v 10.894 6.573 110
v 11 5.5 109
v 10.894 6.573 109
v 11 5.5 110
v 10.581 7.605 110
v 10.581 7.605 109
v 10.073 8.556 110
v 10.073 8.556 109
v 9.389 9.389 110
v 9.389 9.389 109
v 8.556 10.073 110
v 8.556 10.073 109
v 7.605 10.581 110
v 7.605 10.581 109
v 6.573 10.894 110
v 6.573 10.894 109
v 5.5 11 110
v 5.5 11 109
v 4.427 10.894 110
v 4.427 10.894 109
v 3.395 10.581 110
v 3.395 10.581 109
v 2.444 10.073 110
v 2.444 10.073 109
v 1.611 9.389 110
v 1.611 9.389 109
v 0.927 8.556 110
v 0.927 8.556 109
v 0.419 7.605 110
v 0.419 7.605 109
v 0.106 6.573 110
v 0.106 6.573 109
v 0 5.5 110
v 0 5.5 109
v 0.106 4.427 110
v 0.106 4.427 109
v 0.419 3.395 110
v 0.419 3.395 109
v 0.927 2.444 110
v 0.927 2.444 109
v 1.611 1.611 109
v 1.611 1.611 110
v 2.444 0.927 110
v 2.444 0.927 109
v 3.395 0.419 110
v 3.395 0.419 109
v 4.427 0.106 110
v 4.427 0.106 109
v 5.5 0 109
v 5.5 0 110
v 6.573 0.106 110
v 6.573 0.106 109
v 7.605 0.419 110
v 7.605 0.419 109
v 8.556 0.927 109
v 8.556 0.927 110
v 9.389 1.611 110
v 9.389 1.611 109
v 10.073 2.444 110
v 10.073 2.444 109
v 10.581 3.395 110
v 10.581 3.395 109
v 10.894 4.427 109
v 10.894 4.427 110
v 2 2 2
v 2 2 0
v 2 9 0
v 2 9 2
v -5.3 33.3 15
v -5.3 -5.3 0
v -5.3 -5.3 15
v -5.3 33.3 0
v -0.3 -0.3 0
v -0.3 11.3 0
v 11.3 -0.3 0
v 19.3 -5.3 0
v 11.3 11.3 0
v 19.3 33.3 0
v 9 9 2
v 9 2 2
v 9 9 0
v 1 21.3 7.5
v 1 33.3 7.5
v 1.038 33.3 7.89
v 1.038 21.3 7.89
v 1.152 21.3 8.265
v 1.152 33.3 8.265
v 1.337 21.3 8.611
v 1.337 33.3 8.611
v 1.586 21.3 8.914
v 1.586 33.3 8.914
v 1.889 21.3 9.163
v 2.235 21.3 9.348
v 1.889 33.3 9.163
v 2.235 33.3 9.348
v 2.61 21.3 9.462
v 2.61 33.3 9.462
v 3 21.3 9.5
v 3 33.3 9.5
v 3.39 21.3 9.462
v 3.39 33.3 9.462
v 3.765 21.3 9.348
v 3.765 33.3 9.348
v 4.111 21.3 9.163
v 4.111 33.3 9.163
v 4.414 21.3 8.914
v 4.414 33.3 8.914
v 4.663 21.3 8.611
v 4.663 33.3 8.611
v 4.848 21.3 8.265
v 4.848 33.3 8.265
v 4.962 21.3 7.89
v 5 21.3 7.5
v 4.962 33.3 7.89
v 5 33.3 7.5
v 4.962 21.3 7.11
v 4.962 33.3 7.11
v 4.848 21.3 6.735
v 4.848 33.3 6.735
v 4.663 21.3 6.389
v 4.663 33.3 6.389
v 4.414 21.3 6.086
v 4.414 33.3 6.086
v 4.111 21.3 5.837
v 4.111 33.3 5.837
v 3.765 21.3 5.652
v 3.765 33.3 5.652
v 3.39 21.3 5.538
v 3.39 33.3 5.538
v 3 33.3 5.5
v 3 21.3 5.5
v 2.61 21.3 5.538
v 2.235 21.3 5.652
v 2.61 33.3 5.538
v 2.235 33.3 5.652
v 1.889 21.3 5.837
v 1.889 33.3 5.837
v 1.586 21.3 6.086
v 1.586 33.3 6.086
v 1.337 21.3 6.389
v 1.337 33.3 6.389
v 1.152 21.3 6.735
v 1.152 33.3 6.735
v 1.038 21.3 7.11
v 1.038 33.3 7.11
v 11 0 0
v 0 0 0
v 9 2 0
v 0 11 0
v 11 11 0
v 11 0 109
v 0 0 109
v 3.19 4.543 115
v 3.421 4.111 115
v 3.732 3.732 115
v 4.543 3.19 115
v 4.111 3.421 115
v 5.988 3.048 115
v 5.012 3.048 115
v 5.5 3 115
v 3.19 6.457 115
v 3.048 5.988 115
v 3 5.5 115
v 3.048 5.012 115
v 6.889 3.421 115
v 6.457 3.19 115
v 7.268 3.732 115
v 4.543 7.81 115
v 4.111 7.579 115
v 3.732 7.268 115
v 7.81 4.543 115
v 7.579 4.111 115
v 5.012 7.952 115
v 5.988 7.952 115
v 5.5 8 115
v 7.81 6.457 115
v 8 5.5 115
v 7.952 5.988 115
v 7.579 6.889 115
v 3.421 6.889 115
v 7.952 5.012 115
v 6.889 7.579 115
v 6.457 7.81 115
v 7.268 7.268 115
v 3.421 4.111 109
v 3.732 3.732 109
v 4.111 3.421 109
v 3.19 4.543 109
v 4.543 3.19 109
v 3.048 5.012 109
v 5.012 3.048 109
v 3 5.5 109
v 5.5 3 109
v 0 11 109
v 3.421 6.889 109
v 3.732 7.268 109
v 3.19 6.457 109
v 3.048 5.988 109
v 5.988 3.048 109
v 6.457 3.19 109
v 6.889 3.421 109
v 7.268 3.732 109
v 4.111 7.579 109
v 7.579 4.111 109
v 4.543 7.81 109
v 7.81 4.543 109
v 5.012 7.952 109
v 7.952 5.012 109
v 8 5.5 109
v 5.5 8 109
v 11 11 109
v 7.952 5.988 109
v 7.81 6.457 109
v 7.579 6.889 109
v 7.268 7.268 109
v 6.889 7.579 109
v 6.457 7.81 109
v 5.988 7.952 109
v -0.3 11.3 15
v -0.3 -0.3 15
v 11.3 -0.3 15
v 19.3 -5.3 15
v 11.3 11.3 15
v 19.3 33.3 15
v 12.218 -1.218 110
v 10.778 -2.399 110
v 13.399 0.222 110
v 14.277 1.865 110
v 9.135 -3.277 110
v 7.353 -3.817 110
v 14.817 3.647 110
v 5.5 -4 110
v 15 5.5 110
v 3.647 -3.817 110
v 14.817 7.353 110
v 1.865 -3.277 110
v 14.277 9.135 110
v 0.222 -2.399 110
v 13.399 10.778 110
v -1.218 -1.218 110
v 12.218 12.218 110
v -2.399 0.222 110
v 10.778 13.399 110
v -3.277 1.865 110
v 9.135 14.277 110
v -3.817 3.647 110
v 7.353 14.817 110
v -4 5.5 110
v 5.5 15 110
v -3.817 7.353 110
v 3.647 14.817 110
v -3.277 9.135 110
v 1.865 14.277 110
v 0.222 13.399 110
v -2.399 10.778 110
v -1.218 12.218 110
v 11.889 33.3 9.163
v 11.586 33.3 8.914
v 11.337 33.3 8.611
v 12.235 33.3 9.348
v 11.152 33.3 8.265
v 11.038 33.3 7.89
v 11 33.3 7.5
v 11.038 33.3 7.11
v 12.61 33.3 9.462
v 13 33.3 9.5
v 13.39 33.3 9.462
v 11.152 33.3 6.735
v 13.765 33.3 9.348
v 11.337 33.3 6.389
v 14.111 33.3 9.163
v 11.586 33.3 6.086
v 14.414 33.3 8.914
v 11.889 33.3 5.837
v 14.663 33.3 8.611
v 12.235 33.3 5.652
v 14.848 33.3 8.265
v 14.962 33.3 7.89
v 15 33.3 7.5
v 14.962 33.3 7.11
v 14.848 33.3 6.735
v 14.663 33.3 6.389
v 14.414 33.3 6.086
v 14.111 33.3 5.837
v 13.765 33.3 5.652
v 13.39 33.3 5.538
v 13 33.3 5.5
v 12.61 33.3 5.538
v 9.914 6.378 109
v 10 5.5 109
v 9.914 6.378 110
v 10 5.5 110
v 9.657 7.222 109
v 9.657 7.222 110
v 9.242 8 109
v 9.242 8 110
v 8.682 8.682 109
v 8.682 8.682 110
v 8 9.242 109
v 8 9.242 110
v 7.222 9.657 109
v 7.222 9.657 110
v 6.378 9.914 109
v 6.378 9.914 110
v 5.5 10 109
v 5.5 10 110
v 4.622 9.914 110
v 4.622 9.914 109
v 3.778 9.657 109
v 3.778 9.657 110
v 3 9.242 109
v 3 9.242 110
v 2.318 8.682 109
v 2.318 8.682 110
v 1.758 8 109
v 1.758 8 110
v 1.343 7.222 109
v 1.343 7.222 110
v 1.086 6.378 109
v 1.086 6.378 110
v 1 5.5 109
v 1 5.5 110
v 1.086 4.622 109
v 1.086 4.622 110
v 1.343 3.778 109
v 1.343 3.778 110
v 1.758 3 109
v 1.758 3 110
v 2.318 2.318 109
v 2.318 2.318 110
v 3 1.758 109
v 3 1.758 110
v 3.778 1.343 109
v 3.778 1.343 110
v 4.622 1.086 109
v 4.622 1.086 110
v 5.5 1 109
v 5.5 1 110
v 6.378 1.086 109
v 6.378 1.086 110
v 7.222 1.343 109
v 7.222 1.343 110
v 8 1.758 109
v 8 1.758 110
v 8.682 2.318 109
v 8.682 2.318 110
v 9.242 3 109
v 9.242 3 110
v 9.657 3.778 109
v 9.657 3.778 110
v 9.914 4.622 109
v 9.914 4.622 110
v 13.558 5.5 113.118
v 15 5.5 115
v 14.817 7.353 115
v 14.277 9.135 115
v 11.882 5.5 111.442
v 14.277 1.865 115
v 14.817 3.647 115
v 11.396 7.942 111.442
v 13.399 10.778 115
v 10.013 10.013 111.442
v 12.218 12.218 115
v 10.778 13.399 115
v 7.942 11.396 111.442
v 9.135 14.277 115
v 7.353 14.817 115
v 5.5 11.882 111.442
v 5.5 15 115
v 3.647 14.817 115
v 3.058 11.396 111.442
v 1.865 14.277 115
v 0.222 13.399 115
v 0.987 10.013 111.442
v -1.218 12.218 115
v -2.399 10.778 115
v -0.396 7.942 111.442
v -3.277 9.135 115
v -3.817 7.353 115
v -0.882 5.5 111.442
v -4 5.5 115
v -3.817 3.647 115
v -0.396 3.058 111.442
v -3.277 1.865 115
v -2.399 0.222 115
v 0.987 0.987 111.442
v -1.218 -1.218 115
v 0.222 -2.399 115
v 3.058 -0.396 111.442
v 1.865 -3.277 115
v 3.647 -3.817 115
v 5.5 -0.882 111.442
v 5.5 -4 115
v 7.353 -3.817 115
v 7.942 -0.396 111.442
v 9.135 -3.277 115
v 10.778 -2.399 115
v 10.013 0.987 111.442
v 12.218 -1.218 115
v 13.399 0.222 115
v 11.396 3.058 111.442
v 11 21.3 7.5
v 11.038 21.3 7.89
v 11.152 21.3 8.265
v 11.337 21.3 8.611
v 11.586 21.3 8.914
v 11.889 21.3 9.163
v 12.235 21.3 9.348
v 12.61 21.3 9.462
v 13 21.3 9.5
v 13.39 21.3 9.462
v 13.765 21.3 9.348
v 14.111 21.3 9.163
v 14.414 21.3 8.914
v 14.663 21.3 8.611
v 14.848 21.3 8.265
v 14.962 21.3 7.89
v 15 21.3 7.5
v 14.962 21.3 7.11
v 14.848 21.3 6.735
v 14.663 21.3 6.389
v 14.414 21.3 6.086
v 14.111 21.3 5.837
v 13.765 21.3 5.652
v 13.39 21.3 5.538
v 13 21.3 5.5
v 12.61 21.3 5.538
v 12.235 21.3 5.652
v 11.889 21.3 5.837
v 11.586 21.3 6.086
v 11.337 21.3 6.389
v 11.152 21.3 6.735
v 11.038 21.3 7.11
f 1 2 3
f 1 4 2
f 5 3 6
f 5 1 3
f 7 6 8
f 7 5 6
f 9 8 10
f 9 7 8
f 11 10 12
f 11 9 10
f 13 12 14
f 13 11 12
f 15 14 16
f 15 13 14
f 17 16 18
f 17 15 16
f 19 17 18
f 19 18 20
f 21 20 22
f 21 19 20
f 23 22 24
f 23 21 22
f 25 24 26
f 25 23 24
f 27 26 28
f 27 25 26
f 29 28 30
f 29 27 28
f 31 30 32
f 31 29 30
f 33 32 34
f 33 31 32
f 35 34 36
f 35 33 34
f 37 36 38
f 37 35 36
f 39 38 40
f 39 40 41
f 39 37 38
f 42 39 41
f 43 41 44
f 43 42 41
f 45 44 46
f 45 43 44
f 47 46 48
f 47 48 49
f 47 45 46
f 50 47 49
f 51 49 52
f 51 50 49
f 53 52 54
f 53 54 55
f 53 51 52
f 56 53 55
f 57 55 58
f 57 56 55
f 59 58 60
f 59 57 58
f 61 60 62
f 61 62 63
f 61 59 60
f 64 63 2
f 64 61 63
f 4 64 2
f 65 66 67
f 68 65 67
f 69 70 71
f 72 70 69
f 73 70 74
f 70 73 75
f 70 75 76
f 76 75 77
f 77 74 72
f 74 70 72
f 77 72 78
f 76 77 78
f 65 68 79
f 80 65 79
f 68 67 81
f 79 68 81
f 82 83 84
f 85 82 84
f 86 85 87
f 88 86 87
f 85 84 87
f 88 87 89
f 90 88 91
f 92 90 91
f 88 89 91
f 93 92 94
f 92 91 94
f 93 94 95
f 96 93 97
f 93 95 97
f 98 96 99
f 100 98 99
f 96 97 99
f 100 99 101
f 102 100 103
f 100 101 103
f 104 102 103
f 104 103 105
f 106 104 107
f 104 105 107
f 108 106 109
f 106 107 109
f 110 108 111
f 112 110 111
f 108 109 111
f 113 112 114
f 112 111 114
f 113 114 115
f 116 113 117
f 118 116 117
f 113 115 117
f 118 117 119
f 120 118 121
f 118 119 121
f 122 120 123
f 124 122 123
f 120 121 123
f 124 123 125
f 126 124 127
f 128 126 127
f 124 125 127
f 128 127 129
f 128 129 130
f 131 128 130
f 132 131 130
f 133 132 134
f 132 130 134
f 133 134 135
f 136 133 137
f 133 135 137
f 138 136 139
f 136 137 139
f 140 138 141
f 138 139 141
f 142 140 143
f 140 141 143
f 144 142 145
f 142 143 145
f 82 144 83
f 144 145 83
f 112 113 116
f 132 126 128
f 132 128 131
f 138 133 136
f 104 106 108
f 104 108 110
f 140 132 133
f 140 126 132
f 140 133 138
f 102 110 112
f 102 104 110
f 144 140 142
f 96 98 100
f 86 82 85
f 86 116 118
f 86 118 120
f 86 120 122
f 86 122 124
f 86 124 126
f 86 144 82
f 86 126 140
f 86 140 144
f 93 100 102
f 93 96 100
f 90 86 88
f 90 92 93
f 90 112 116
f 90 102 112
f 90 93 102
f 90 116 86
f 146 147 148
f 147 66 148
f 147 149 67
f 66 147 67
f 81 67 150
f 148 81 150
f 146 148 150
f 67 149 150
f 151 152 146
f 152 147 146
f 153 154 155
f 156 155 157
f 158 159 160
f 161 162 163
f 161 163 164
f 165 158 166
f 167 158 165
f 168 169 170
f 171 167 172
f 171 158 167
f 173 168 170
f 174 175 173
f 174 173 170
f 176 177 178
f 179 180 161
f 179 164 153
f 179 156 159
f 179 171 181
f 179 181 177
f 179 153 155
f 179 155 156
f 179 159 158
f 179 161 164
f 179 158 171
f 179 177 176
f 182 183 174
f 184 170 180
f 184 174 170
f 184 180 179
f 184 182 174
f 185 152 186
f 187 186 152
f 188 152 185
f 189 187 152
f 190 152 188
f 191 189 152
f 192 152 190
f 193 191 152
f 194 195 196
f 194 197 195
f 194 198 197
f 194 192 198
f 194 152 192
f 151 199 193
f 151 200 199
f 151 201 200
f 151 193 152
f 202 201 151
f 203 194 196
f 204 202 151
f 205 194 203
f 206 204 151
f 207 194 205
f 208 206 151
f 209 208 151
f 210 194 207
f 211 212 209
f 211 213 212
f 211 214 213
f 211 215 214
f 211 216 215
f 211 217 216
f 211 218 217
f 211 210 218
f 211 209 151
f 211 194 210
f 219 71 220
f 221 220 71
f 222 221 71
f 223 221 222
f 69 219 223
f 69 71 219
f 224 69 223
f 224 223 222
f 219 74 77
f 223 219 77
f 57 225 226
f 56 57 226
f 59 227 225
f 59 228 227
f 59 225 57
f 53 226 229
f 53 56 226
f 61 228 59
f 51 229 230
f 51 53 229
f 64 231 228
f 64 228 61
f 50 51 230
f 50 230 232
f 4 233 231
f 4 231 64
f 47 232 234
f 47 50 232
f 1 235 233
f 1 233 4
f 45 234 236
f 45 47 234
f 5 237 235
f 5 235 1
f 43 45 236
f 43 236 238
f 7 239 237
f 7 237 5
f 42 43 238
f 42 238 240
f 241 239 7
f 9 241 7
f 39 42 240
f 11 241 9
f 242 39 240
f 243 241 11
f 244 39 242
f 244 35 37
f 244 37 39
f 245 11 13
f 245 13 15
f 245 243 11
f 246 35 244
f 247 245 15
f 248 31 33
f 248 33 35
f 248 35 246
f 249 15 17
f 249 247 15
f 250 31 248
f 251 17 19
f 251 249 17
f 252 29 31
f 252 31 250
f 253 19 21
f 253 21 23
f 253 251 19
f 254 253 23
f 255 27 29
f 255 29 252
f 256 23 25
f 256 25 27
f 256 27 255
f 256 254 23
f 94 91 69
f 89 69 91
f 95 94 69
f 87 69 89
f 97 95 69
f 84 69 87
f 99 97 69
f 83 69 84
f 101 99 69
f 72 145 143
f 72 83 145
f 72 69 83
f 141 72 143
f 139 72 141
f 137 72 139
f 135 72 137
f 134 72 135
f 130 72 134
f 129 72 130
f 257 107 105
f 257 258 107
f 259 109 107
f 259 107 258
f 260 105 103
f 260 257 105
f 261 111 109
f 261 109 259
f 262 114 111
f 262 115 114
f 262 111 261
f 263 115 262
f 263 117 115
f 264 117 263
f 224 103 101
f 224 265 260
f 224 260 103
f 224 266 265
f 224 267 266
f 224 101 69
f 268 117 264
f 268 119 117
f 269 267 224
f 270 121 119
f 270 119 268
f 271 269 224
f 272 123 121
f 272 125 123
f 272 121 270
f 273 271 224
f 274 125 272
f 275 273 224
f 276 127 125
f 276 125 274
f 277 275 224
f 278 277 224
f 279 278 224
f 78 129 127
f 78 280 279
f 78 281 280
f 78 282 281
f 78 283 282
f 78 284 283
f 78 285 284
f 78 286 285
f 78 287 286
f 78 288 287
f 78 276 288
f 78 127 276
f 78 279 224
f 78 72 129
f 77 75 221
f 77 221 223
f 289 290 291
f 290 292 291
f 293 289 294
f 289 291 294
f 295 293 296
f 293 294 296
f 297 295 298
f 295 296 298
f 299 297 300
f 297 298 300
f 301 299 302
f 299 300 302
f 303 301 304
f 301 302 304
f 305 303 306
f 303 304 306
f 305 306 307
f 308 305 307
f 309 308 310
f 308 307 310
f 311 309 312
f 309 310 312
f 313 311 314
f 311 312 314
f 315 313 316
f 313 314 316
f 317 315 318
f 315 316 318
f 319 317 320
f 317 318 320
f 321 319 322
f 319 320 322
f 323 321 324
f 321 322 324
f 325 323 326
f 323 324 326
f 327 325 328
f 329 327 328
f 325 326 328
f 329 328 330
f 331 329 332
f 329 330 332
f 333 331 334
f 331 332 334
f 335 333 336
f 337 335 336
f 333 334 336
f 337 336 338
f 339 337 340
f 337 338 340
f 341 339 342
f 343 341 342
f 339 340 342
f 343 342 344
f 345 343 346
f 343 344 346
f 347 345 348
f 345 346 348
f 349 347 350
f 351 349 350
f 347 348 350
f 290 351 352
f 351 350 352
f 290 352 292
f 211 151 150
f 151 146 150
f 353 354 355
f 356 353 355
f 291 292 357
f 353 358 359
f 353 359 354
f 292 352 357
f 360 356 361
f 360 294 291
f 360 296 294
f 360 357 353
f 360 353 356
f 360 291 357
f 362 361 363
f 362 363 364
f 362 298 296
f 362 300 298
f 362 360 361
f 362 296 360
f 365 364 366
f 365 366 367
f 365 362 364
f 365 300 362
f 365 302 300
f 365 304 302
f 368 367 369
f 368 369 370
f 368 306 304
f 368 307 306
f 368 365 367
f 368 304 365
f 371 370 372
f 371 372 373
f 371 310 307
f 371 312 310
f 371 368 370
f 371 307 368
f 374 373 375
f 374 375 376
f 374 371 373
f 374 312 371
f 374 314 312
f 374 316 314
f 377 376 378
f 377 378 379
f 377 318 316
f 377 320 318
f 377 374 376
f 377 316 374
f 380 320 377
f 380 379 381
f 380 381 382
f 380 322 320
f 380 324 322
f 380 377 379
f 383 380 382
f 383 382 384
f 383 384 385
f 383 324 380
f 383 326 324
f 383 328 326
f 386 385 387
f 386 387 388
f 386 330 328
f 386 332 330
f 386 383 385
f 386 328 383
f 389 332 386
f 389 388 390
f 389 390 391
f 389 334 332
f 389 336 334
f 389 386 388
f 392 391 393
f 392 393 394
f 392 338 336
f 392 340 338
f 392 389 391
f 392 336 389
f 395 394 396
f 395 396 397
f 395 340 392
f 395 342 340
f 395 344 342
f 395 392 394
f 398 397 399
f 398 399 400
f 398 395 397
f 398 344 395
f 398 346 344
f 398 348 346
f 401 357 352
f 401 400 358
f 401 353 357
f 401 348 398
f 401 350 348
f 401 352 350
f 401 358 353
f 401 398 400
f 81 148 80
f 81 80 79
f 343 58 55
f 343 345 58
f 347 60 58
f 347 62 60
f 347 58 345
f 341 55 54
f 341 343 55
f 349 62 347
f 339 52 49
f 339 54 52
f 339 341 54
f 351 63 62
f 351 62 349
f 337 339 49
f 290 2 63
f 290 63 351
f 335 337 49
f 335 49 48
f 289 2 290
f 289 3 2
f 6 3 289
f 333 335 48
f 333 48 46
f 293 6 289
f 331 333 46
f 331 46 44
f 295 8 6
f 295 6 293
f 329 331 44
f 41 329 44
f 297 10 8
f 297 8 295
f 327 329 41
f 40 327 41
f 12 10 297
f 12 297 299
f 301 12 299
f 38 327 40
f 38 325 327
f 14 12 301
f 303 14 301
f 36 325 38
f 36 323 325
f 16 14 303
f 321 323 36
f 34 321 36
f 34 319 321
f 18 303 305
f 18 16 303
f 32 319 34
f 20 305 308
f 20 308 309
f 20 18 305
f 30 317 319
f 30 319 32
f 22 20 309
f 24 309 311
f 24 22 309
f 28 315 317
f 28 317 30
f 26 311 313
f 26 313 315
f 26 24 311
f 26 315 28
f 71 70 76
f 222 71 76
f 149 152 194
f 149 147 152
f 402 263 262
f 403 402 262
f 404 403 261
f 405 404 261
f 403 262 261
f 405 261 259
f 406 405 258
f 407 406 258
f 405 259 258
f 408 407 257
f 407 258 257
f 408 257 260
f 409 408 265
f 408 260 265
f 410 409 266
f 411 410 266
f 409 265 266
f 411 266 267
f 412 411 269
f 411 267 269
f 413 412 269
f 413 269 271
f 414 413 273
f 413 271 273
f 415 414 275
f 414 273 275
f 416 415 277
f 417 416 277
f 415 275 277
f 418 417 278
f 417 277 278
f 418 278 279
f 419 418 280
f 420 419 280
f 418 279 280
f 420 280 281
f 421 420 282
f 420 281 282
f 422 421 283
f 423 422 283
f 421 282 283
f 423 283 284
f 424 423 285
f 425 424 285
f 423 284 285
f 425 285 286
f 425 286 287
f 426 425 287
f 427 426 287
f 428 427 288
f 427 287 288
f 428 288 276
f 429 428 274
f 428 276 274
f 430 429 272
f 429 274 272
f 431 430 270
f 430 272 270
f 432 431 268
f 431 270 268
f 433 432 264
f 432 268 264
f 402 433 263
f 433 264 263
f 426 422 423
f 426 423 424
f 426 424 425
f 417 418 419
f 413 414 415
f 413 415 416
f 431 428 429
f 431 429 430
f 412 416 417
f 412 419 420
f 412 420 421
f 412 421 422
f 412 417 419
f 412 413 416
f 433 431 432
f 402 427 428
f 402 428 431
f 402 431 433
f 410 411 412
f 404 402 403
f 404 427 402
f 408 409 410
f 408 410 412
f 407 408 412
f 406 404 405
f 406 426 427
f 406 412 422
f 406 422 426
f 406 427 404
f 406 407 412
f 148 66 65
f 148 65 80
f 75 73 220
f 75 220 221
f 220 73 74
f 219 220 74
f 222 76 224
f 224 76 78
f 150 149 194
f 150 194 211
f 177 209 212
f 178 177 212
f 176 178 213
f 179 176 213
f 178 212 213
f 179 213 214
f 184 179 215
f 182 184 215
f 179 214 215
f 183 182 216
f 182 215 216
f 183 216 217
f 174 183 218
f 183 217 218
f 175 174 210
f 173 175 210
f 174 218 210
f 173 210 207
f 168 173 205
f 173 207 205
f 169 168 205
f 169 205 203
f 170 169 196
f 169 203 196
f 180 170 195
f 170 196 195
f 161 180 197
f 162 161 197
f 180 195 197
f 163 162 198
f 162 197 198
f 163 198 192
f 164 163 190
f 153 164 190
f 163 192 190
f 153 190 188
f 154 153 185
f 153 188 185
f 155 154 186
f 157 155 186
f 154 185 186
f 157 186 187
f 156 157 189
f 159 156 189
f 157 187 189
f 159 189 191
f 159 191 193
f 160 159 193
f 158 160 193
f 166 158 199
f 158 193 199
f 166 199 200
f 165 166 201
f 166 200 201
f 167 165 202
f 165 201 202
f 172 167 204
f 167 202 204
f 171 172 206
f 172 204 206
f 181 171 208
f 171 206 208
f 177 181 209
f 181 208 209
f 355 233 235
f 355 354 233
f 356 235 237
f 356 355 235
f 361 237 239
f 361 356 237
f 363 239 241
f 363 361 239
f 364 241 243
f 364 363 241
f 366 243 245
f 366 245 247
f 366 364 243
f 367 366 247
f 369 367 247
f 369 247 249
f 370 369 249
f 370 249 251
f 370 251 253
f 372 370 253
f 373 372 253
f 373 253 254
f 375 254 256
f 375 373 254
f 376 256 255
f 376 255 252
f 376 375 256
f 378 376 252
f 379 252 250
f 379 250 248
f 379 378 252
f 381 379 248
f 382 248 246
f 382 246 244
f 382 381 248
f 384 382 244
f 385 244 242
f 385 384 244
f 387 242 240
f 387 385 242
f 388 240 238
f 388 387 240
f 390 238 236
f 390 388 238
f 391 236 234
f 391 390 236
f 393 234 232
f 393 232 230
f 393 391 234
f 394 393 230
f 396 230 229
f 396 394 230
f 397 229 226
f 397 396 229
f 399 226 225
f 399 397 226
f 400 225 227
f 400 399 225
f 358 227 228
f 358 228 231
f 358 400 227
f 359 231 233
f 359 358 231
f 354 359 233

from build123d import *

# Parameters (mm, degrees)
F0_W      = 11
F0_H      = 11
F0_W_2    = 7
F0_H_2    = 7
F1_DEPTH  = 2
F2_W      = 11
F2_H      = 11
F3_DEPTH  = 107
F4_R      = 2.5
F5_DEPTH  = 6
F9_W      = 1
F9_H      = 1
F11_W     = 24.6
F11_H     = 38.6
F11_W_2   = 11.6
F11_H_2   = 11.6
F12_DEPTH = 15
F13_R     = 2
F14_DEPTH = 12


with BuildPart() as f1:
    # F0 (on Top) → F1 (new body)
    with BuildSketch(Plane.XY):
        with Locations((5.5, 5.5)):
            Rectangle(F0_W, F0_H)
        with Locations((5.5, 5.5)):
            Rectangle(F0_W_2, F0_H_2, mode=Mode.SUBTRACT)
    extrude(amount=F1_DEPTH)

    # F2 (on face) → F3 (join)
    with BuildSketch(Plane.XY.offset(2)):
        with Locations((5.5, 5.5)):
            Rectangle(F2_W, F2_H)
    extrude(amount=F3_DEPTH)

    # F4 (on face) → F5 (join)
    with BuildSketch(Plane.XY.offset(109)):
        with Locations((5.5, 5.5)):
            Circle(F4_R)
    extrude(amount=F5_DEPTH)


with BuildPart() as f10:
    # F9 (on mid) → F10 (revolve)
    with BuildSketch(Plane.XZ.offset(-5.5)):
        with BuildLine():
            Line((11, 110), (15, 110))
            Line((15, 110), (15, 115))
            ThreePointArc((15, 115), (12.747548784, 112.252451216), (10, 110))
            Line((10, 110), (11, 110))
        make_face()
        with Locations((10.5, 109.5)):
            Rectangle(F9_W, F9_H)
    revolve(axis=Axis((5.5, 5.5, 115), (0, 0, 1)))


with BuildPart() as f12:
    # F11 (on Top) → F12 (new body)
    with BuildSketch(Plane.XY):
        with Locations((7, 14)):
            Rectangle(F11_W, F11_H)
        with Locations((5.5, 5.5)):
            Rectangle(F11_W_2, F11_H_2, mode=Mode.SUBTRACT)
    extrude(amount=F12_DEPTH)

    # F13 (on face) → F14 (cut)
    with BuildSketch(Plane(origin=(0, 33.3, 0), x_dir=(-1, 0, 0), z_dir=(0, 1, 0))):
        with Locations((-13, 7.5)):
            Circle(F13_R)
        with Locations((-3, 7.5)):
            Circle(F13_R)
    extrude(amount=-F14_DEPTH, mode=Mode.SUBTRACT)


solid = Compound([f1.part, f10.part, f12.part])
